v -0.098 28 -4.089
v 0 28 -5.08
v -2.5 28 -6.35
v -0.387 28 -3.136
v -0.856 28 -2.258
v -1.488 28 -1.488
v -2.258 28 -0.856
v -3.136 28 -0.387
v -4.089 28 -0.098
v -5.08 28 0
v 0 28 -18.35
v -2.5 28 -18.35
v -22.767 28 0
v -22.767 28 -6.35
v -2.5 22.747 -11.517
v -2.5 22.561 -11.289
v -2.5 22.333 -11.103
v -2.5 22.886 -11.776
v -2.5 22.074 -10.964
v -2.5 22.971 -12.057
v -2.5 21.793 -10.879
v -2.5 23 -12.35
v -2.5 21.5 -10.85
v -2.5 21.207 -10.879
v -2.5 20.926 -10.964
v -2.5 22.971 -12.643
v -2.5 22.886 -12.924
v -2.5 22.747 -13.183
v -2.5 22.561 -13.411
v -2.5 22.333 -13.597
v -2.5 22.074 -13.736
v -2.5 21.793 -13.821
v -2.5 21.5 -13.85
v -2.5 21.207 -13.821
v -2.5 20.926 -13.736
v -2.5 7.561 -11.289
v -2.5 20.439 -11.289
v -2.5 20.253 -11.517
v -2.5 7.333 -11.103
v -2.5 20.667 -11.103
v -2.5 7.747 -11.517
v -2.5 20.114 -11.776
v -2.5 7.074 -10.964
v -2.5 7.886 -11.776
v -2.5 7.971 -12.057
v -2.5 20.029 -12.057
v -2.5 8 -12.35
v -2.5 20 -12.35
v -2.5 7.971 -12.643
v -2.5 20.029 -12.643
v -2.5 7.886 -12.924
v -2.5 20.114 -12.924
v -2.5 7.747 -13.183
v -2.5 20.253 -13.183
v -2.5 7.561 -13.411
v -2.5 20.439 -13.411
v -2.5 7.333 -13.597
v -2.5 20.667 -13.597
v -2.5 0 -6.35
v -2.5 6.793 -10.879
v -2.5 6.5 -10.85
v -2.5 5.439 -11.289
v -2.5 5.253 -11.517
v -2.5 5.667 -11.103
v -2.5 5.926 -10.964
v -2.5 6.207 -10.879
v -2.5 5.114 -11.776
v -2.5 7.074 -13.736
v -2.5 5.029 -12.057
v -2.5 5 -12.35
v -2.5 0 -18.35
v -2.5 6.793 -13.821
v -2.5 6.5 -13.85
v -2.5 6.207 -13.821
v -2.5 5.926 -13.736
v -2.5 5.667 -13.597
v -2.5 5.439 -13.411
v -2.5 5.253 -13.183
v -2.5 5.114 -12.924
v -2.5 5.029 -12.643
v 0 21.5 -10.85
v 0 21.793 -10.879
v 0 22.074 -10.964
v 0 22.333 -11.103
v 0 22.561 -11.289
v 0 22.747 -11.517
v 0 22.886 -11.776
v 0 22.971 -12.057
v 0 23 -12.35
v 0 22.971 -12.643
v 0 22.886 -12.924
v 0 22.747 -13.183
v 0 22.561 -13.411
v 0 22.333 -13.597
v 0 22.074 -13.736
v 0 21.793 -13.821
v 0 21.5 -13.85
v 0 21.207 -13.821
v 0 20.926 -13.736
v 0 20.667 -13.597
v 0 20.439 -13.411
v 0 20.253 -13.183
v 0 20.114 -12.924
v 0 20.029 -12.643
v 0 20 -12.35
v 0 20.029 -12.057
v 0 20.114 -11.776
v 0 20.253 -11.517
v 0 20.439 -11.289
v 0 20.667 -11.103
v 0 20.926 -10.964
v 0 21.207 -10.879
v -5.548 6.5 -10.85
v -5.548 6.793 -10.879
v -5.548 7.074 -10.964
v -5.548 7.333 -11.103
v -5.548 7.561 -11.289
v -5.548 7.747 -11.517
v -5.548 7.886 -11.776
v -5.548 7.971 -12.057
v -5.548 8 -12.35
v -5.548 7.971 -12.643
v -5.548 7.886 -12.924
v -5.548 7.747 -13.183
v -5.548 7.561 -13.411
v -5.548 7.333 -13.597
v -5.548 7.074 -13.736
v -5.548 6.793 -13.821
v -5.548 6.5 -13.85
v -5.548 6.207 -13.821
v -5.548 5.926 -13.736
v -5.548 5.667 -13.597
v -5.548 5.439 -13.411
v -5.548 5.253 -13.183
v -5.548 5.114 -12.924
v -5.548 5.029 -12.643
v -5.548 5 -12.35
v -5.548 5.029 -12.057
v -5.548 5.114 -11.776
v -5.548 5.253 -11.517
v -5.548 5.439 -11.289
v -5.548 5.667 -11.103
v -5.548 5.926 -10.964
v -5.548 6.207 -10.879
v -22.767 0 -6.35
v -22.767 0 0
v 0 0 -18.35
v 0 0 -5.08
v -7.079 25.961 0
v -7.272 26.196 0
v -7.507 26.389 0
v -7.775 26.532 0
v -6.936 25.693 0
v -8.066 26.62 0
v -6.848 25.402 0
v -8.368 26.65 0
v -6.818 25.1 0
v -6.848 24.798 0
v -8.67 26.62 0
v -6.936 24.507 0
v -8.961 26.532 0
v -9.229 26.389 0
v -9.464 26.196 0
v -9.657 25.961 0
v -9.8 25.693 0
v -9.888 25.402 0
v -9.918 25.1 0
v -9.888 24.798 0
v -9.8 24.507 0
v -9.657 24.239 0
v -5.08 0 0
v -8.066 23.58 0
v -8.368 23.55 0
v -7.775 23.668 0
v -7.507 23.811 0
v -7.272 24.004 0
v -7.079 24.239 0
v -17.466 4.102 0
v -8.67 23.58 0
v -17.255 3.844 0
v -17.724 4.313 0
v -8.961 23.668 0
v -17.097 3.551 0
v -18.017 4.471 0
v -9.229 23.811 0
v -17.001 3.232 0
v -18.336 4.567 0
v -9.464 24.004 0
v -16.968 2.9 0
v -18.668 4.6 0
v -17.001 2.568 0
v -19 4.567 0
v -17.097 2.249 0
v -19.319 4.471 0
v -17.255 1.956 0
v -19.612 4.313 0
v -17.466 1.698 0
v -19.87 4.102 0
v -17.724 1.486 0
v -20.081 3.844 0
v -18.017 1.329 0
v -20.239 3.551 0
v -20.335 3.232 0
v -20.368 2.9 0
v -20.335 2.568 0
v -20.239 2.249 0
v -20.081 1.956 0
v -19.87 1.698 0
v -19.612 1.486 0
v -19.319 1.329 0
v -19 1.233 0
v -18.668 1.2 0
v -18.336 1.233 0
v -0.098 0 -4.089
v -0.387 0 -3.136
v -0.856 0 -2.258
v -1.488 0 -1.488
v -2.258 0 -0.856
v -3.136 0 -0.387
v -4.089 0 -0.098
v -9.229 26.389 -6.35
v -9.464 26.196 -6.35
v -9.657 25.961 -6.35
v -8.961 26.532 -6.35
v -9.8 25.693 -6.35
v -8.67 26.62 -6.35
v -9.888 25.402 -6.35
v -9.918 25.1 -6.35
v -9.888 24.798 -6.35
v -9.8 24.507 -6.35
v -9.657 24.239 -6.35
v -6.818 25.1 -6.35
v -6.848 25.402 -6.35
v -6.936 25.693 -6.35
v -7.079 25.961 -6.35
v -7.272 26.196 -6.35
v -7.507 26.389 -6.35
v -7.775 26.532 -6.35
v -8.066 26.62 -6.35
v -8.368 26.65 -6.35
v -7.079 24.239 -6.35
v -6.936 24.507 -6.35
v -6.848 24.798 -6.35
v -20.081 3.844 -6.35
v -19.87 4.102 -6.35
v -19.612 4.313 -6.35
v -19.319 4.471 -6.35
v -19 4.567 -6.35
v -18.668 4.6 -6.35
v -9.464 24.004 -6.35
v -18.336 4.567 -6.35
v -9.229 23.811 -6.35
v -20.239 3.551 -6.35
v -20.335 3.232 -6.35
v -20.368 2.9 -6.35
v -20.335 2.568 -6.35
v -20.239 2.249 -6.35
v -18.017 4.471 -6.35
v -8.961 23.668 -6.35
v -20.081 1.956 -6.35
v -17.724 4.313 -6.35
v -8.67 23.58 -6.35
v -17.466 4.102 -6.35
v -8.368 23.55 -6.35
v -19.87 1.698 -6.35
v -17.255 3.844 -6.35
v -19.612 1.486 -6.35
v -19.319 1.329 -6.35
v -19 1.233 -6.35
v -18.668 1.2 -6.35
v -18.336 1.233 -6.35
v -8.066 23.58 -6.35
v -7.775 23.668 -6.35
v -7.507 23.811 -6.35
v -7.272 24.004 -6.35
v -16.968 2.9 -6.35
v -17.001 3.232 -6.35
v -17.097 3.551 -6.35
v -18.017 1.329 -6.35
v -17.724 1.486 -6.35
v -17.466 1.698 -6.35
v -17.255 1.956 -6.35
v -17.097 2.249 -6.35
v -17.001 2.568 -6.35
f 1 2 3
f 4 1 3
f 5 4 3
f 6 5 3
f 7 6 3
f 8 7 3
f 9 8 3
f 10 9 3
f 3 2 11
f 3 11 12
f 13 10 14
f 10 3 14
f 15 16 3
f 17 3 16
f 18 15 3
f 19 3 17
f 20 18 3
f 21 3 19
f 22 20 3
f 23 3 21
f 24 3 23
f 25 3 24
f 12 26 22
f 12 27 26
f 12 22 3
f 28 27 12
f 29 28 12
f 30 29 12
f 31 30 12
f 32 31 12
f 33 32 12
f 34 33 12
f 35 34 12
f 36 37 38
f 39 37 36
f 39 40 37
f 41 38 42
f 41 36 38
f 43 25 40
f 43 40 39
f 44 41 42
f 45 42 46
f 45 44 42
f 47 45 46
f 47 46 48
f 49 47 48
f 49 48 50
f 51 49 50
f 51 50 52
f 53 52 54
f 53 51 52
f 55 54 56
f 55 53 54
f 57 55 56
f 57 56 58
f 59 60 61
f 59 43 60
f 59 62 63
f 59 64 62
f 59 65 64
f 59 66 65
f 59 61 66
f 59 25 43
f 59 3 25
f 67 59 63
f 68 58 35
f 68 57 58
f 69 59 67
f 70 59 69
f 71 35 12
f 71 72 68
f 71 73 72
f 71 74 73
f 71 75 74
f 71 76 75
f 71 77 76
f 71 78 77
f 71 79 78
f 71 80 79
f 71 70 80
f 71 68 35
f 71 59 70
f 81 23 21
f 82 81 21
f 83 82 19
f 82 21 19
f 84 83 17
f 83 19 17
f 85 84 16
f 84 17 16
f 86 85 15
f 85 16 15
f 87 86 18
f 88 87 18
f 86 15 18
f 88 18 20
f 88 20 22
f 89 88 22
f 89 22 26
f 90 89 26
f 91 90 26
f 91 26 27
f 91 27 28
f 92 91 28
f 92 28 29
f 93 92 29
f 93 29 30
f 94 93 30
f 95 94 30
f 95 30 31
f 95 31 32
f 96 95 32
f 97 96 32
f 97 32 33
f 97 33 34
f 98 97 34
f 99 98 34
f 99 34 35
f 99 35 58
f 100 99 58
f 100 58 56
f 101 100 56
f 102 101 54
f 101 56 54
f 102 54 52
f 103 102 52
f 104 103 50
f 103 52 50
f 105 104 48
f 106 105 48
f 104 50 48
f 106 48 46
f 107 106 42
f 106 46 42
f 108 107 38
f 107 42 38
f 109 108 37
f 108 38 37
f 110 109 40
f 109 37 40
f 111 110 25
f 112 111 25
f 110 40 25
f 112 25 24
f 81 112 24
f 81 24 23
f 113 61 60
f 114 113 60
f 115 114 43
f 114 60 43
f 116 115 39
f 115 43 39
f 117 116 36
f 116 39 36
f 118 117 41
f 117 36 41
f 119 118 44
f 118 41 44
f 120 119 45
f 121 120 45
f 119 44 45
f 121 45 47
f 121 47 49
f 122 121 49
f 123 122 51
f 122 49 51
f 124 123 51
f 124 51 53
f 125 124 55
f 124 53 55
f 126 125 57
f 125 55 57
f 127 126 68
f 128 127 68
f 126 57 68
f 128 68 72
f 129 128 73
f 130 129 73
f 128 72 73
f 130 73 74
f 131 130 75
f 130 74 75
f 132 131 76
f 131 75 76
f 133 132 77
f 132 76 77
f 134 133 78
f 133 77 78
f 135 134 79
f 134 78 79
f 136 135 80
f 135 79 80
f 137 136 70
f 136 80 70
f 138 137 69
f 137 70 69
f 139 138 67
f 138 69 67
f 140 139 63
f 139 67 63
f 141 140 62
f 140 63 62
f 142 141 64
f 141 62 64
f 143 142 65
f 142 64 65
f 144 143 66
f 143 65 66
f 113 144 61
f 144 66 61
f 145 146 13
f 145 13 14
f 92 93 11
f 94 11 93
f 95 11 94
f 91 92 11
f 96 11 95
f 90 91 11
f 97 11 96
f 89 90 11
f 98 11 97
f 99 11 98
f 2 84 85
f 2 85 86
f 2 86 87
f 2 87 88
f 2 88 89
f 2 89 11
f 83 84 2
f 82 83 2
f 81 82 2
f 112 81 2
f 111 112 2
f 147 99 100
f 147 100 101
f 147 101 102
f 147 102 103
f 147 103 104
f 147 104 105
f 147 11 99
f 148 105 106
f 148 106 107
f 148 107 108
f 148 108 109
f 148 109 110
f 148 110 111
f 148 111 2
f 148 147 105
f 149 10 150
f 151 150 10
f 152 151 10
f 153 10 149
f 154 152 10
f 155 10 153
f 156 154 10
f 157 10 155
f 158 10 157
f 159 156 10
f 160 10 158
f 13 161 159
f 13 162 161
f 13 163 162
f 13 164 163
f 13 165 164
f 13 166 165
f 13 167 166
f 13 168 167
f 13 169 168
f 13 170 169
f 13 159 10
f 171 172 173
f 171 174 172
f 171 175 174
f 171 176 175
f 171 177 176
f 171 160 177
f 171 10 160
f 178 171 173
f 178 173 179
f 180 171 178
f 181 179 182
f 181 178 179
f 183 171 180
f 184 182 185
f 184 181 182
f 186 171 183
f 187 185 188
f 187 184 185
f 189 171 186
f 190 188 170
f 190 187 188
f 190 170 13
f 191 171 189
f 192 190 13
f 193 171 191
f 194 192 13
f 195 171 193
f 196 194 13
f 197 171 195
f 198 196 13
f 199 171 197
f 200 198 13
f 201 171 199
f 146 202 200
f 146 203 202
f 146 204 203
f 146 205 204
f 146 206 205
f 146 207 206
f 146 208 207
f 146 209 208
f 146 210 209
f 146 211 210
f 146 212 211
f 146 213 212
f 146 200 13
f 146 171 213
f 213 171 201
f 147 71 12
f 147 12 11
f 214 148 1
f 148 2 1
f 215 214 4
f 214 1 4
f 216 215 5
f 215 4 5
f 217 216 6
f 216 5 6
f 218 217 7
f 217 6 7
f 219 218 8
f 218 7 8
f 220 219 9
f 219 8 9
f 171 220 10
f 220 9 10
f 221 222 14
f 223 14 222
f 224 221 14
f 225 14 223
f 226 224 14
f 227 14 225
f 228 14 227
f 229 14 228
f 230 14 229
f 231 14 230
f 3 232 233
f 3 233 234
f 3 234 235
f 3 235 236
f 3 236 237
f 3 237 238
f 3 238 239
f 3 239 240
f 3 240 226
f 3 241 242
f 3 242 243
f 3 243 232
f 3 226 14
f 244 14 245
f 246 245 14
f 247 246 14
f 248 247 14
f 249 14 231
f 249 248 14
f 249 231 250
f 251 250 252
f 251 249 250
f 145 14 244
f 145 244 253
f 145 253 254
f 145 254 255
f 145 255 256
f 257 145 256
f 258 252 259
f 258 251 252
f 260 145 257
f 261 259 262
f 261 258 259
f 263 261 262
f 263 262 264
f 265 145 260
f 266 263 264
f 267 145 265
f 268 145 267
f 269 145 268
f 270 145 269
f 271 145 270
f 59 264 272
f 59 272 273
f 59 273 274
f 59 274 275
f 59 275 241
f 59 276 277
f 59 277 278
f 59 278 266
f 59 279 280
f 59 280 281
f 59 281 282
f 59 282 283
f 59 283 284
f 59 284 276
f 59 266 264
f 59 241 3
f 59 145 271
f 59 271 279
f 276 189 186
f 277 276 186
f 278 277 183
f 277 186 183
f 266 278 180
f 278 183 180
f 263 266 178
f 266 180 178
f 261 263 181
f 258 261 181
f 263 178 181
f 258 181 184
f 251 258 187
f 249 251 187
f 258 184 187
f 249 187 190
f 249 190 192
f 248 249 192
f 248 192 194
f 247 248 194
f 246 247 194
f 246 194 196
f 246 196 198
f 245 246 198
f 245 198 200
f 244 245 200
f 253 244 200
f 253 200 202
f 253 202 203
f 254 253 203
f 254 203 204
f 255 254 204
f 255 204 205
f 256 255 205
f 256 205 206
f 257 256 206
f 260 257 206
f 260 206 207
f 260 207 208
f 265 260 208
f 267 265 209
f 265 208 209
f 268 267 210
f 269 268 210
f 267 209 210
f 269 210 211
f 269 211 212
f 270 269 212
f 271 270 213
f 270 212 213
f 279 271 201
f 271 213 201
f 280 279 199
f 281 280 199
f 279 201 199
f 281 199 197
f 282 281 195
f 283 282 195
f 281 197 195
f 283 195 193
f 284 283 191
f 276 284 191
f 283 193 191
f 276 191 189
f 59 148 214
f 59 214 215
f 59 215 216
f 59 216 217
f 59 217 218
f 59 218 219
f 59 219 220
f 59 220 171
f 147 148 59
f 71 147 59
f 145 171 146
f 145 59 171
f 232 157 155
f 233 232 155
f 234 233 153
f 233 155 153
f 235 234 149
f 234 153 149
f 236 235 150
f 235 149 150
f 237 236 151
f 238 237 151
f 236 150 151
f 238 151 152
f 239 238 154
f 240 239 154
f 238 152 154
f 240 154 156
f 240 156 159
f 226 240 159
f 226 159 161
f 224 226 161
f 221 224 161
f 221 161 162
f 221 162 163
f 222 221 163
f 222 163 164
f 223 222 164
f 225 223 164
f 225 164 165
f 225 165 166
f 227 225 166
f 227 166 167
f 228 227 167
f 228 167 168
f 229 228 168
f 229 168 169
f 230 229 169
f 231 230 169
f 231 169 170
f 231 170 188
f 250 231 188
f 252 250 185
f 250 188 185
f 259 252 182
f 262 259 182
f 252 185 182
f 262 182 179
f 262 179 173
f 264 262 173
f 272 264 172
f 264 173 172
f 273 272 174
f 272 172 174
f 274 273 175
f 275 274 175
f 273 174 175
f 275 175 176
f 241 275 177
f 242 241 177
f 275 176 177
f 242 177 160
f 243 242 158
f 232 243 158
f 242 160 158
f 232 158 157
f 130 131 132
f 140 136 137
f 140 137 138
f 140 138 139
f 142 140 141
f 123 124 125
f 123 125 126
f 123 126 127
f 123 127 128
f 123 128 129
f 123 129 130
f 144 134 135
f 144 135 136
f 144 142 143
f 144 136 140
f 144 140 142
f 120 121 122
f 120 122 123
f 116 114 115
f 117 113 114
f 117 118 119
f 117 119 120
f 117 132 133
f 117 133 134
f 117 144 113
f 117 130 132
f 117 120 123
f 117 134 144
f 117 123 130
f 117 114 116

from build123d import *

# Parameters (mm, degrees)
BOSS_EXTRUDE1_DEPTH = 27.9999948
SKETCH2_R           = 1.5
CUT_EXTRUDE1_DEPTH  = 3.5
SKETCH3_R           = 1.55
SKETCH3_R_2         = 1.7
CUT_EXTRUDE2_DEPTH  = 19.35
FILLET1_R           = 5.08
SKETCH2_3_R         = 1.5
BOSS_EXTRUDE2_DEPTH = 3.048


with BuildPart() as part:
    # Sketch1 → Boss-Extrude1 (new body)
    with BuildSketch(Plane(origin=(0, 0, 0), x_dir=(1, 0, 0), z_dir=(0, 1, 0))):
        Polygon((0, 18.35), (0, 0), (-22.7671934, 0), (-22.7671934, 6.35), (-2.5, 6.35), (-2.5, 18.35), align=None)
    extrude(amount=BOSS_EXTRUDE1_DEPTH)

    # Sketch2 → Cut-Extrude1 (cut, through all)
    with BuildSketch(Plane.ZY.offset(2.5)):
        with Locations((-12.35, 21.4999951)):
            Circle(SKETCH2_R)
    extrude(amount=-CUT_EXTRUDE1_DEPTH, mode=Mode.SUBTRACT)

    # Sketch3 → Cut-Extrude2 (cut, through all)
    with BuildSketch(Plane.XY):
        with Locations((-8.368, 25.0999974)):
            Circle(SKETCH3_R)
        with Locations((-18.668, 2.8999974)):
            Circle(SKETCH3_R_2)
    extrude(amount=-CUT_EXTRUDE2_DEPTH, mode=Mode.SUBTRACT)

    # Fillet1
    fillet1_edges = [part.edges().sort_by_distance(p)[0] for p in [
        (0, 13.9999974, 0),
    ]]
    fillet(fillet1_edges, radius=FILLET1_R)

    # Sketch2<3> → Boss-Extrude2 (add)
    with BuildSketch(Plane.ZY.offset(2.5)):
        with Locations((-12.35, 6.4999997)):
            Circle(SKETCH2_3_R)
    extrude(amount=BOSS_EXTRUDE2_DEPTH)


solid = part.part
